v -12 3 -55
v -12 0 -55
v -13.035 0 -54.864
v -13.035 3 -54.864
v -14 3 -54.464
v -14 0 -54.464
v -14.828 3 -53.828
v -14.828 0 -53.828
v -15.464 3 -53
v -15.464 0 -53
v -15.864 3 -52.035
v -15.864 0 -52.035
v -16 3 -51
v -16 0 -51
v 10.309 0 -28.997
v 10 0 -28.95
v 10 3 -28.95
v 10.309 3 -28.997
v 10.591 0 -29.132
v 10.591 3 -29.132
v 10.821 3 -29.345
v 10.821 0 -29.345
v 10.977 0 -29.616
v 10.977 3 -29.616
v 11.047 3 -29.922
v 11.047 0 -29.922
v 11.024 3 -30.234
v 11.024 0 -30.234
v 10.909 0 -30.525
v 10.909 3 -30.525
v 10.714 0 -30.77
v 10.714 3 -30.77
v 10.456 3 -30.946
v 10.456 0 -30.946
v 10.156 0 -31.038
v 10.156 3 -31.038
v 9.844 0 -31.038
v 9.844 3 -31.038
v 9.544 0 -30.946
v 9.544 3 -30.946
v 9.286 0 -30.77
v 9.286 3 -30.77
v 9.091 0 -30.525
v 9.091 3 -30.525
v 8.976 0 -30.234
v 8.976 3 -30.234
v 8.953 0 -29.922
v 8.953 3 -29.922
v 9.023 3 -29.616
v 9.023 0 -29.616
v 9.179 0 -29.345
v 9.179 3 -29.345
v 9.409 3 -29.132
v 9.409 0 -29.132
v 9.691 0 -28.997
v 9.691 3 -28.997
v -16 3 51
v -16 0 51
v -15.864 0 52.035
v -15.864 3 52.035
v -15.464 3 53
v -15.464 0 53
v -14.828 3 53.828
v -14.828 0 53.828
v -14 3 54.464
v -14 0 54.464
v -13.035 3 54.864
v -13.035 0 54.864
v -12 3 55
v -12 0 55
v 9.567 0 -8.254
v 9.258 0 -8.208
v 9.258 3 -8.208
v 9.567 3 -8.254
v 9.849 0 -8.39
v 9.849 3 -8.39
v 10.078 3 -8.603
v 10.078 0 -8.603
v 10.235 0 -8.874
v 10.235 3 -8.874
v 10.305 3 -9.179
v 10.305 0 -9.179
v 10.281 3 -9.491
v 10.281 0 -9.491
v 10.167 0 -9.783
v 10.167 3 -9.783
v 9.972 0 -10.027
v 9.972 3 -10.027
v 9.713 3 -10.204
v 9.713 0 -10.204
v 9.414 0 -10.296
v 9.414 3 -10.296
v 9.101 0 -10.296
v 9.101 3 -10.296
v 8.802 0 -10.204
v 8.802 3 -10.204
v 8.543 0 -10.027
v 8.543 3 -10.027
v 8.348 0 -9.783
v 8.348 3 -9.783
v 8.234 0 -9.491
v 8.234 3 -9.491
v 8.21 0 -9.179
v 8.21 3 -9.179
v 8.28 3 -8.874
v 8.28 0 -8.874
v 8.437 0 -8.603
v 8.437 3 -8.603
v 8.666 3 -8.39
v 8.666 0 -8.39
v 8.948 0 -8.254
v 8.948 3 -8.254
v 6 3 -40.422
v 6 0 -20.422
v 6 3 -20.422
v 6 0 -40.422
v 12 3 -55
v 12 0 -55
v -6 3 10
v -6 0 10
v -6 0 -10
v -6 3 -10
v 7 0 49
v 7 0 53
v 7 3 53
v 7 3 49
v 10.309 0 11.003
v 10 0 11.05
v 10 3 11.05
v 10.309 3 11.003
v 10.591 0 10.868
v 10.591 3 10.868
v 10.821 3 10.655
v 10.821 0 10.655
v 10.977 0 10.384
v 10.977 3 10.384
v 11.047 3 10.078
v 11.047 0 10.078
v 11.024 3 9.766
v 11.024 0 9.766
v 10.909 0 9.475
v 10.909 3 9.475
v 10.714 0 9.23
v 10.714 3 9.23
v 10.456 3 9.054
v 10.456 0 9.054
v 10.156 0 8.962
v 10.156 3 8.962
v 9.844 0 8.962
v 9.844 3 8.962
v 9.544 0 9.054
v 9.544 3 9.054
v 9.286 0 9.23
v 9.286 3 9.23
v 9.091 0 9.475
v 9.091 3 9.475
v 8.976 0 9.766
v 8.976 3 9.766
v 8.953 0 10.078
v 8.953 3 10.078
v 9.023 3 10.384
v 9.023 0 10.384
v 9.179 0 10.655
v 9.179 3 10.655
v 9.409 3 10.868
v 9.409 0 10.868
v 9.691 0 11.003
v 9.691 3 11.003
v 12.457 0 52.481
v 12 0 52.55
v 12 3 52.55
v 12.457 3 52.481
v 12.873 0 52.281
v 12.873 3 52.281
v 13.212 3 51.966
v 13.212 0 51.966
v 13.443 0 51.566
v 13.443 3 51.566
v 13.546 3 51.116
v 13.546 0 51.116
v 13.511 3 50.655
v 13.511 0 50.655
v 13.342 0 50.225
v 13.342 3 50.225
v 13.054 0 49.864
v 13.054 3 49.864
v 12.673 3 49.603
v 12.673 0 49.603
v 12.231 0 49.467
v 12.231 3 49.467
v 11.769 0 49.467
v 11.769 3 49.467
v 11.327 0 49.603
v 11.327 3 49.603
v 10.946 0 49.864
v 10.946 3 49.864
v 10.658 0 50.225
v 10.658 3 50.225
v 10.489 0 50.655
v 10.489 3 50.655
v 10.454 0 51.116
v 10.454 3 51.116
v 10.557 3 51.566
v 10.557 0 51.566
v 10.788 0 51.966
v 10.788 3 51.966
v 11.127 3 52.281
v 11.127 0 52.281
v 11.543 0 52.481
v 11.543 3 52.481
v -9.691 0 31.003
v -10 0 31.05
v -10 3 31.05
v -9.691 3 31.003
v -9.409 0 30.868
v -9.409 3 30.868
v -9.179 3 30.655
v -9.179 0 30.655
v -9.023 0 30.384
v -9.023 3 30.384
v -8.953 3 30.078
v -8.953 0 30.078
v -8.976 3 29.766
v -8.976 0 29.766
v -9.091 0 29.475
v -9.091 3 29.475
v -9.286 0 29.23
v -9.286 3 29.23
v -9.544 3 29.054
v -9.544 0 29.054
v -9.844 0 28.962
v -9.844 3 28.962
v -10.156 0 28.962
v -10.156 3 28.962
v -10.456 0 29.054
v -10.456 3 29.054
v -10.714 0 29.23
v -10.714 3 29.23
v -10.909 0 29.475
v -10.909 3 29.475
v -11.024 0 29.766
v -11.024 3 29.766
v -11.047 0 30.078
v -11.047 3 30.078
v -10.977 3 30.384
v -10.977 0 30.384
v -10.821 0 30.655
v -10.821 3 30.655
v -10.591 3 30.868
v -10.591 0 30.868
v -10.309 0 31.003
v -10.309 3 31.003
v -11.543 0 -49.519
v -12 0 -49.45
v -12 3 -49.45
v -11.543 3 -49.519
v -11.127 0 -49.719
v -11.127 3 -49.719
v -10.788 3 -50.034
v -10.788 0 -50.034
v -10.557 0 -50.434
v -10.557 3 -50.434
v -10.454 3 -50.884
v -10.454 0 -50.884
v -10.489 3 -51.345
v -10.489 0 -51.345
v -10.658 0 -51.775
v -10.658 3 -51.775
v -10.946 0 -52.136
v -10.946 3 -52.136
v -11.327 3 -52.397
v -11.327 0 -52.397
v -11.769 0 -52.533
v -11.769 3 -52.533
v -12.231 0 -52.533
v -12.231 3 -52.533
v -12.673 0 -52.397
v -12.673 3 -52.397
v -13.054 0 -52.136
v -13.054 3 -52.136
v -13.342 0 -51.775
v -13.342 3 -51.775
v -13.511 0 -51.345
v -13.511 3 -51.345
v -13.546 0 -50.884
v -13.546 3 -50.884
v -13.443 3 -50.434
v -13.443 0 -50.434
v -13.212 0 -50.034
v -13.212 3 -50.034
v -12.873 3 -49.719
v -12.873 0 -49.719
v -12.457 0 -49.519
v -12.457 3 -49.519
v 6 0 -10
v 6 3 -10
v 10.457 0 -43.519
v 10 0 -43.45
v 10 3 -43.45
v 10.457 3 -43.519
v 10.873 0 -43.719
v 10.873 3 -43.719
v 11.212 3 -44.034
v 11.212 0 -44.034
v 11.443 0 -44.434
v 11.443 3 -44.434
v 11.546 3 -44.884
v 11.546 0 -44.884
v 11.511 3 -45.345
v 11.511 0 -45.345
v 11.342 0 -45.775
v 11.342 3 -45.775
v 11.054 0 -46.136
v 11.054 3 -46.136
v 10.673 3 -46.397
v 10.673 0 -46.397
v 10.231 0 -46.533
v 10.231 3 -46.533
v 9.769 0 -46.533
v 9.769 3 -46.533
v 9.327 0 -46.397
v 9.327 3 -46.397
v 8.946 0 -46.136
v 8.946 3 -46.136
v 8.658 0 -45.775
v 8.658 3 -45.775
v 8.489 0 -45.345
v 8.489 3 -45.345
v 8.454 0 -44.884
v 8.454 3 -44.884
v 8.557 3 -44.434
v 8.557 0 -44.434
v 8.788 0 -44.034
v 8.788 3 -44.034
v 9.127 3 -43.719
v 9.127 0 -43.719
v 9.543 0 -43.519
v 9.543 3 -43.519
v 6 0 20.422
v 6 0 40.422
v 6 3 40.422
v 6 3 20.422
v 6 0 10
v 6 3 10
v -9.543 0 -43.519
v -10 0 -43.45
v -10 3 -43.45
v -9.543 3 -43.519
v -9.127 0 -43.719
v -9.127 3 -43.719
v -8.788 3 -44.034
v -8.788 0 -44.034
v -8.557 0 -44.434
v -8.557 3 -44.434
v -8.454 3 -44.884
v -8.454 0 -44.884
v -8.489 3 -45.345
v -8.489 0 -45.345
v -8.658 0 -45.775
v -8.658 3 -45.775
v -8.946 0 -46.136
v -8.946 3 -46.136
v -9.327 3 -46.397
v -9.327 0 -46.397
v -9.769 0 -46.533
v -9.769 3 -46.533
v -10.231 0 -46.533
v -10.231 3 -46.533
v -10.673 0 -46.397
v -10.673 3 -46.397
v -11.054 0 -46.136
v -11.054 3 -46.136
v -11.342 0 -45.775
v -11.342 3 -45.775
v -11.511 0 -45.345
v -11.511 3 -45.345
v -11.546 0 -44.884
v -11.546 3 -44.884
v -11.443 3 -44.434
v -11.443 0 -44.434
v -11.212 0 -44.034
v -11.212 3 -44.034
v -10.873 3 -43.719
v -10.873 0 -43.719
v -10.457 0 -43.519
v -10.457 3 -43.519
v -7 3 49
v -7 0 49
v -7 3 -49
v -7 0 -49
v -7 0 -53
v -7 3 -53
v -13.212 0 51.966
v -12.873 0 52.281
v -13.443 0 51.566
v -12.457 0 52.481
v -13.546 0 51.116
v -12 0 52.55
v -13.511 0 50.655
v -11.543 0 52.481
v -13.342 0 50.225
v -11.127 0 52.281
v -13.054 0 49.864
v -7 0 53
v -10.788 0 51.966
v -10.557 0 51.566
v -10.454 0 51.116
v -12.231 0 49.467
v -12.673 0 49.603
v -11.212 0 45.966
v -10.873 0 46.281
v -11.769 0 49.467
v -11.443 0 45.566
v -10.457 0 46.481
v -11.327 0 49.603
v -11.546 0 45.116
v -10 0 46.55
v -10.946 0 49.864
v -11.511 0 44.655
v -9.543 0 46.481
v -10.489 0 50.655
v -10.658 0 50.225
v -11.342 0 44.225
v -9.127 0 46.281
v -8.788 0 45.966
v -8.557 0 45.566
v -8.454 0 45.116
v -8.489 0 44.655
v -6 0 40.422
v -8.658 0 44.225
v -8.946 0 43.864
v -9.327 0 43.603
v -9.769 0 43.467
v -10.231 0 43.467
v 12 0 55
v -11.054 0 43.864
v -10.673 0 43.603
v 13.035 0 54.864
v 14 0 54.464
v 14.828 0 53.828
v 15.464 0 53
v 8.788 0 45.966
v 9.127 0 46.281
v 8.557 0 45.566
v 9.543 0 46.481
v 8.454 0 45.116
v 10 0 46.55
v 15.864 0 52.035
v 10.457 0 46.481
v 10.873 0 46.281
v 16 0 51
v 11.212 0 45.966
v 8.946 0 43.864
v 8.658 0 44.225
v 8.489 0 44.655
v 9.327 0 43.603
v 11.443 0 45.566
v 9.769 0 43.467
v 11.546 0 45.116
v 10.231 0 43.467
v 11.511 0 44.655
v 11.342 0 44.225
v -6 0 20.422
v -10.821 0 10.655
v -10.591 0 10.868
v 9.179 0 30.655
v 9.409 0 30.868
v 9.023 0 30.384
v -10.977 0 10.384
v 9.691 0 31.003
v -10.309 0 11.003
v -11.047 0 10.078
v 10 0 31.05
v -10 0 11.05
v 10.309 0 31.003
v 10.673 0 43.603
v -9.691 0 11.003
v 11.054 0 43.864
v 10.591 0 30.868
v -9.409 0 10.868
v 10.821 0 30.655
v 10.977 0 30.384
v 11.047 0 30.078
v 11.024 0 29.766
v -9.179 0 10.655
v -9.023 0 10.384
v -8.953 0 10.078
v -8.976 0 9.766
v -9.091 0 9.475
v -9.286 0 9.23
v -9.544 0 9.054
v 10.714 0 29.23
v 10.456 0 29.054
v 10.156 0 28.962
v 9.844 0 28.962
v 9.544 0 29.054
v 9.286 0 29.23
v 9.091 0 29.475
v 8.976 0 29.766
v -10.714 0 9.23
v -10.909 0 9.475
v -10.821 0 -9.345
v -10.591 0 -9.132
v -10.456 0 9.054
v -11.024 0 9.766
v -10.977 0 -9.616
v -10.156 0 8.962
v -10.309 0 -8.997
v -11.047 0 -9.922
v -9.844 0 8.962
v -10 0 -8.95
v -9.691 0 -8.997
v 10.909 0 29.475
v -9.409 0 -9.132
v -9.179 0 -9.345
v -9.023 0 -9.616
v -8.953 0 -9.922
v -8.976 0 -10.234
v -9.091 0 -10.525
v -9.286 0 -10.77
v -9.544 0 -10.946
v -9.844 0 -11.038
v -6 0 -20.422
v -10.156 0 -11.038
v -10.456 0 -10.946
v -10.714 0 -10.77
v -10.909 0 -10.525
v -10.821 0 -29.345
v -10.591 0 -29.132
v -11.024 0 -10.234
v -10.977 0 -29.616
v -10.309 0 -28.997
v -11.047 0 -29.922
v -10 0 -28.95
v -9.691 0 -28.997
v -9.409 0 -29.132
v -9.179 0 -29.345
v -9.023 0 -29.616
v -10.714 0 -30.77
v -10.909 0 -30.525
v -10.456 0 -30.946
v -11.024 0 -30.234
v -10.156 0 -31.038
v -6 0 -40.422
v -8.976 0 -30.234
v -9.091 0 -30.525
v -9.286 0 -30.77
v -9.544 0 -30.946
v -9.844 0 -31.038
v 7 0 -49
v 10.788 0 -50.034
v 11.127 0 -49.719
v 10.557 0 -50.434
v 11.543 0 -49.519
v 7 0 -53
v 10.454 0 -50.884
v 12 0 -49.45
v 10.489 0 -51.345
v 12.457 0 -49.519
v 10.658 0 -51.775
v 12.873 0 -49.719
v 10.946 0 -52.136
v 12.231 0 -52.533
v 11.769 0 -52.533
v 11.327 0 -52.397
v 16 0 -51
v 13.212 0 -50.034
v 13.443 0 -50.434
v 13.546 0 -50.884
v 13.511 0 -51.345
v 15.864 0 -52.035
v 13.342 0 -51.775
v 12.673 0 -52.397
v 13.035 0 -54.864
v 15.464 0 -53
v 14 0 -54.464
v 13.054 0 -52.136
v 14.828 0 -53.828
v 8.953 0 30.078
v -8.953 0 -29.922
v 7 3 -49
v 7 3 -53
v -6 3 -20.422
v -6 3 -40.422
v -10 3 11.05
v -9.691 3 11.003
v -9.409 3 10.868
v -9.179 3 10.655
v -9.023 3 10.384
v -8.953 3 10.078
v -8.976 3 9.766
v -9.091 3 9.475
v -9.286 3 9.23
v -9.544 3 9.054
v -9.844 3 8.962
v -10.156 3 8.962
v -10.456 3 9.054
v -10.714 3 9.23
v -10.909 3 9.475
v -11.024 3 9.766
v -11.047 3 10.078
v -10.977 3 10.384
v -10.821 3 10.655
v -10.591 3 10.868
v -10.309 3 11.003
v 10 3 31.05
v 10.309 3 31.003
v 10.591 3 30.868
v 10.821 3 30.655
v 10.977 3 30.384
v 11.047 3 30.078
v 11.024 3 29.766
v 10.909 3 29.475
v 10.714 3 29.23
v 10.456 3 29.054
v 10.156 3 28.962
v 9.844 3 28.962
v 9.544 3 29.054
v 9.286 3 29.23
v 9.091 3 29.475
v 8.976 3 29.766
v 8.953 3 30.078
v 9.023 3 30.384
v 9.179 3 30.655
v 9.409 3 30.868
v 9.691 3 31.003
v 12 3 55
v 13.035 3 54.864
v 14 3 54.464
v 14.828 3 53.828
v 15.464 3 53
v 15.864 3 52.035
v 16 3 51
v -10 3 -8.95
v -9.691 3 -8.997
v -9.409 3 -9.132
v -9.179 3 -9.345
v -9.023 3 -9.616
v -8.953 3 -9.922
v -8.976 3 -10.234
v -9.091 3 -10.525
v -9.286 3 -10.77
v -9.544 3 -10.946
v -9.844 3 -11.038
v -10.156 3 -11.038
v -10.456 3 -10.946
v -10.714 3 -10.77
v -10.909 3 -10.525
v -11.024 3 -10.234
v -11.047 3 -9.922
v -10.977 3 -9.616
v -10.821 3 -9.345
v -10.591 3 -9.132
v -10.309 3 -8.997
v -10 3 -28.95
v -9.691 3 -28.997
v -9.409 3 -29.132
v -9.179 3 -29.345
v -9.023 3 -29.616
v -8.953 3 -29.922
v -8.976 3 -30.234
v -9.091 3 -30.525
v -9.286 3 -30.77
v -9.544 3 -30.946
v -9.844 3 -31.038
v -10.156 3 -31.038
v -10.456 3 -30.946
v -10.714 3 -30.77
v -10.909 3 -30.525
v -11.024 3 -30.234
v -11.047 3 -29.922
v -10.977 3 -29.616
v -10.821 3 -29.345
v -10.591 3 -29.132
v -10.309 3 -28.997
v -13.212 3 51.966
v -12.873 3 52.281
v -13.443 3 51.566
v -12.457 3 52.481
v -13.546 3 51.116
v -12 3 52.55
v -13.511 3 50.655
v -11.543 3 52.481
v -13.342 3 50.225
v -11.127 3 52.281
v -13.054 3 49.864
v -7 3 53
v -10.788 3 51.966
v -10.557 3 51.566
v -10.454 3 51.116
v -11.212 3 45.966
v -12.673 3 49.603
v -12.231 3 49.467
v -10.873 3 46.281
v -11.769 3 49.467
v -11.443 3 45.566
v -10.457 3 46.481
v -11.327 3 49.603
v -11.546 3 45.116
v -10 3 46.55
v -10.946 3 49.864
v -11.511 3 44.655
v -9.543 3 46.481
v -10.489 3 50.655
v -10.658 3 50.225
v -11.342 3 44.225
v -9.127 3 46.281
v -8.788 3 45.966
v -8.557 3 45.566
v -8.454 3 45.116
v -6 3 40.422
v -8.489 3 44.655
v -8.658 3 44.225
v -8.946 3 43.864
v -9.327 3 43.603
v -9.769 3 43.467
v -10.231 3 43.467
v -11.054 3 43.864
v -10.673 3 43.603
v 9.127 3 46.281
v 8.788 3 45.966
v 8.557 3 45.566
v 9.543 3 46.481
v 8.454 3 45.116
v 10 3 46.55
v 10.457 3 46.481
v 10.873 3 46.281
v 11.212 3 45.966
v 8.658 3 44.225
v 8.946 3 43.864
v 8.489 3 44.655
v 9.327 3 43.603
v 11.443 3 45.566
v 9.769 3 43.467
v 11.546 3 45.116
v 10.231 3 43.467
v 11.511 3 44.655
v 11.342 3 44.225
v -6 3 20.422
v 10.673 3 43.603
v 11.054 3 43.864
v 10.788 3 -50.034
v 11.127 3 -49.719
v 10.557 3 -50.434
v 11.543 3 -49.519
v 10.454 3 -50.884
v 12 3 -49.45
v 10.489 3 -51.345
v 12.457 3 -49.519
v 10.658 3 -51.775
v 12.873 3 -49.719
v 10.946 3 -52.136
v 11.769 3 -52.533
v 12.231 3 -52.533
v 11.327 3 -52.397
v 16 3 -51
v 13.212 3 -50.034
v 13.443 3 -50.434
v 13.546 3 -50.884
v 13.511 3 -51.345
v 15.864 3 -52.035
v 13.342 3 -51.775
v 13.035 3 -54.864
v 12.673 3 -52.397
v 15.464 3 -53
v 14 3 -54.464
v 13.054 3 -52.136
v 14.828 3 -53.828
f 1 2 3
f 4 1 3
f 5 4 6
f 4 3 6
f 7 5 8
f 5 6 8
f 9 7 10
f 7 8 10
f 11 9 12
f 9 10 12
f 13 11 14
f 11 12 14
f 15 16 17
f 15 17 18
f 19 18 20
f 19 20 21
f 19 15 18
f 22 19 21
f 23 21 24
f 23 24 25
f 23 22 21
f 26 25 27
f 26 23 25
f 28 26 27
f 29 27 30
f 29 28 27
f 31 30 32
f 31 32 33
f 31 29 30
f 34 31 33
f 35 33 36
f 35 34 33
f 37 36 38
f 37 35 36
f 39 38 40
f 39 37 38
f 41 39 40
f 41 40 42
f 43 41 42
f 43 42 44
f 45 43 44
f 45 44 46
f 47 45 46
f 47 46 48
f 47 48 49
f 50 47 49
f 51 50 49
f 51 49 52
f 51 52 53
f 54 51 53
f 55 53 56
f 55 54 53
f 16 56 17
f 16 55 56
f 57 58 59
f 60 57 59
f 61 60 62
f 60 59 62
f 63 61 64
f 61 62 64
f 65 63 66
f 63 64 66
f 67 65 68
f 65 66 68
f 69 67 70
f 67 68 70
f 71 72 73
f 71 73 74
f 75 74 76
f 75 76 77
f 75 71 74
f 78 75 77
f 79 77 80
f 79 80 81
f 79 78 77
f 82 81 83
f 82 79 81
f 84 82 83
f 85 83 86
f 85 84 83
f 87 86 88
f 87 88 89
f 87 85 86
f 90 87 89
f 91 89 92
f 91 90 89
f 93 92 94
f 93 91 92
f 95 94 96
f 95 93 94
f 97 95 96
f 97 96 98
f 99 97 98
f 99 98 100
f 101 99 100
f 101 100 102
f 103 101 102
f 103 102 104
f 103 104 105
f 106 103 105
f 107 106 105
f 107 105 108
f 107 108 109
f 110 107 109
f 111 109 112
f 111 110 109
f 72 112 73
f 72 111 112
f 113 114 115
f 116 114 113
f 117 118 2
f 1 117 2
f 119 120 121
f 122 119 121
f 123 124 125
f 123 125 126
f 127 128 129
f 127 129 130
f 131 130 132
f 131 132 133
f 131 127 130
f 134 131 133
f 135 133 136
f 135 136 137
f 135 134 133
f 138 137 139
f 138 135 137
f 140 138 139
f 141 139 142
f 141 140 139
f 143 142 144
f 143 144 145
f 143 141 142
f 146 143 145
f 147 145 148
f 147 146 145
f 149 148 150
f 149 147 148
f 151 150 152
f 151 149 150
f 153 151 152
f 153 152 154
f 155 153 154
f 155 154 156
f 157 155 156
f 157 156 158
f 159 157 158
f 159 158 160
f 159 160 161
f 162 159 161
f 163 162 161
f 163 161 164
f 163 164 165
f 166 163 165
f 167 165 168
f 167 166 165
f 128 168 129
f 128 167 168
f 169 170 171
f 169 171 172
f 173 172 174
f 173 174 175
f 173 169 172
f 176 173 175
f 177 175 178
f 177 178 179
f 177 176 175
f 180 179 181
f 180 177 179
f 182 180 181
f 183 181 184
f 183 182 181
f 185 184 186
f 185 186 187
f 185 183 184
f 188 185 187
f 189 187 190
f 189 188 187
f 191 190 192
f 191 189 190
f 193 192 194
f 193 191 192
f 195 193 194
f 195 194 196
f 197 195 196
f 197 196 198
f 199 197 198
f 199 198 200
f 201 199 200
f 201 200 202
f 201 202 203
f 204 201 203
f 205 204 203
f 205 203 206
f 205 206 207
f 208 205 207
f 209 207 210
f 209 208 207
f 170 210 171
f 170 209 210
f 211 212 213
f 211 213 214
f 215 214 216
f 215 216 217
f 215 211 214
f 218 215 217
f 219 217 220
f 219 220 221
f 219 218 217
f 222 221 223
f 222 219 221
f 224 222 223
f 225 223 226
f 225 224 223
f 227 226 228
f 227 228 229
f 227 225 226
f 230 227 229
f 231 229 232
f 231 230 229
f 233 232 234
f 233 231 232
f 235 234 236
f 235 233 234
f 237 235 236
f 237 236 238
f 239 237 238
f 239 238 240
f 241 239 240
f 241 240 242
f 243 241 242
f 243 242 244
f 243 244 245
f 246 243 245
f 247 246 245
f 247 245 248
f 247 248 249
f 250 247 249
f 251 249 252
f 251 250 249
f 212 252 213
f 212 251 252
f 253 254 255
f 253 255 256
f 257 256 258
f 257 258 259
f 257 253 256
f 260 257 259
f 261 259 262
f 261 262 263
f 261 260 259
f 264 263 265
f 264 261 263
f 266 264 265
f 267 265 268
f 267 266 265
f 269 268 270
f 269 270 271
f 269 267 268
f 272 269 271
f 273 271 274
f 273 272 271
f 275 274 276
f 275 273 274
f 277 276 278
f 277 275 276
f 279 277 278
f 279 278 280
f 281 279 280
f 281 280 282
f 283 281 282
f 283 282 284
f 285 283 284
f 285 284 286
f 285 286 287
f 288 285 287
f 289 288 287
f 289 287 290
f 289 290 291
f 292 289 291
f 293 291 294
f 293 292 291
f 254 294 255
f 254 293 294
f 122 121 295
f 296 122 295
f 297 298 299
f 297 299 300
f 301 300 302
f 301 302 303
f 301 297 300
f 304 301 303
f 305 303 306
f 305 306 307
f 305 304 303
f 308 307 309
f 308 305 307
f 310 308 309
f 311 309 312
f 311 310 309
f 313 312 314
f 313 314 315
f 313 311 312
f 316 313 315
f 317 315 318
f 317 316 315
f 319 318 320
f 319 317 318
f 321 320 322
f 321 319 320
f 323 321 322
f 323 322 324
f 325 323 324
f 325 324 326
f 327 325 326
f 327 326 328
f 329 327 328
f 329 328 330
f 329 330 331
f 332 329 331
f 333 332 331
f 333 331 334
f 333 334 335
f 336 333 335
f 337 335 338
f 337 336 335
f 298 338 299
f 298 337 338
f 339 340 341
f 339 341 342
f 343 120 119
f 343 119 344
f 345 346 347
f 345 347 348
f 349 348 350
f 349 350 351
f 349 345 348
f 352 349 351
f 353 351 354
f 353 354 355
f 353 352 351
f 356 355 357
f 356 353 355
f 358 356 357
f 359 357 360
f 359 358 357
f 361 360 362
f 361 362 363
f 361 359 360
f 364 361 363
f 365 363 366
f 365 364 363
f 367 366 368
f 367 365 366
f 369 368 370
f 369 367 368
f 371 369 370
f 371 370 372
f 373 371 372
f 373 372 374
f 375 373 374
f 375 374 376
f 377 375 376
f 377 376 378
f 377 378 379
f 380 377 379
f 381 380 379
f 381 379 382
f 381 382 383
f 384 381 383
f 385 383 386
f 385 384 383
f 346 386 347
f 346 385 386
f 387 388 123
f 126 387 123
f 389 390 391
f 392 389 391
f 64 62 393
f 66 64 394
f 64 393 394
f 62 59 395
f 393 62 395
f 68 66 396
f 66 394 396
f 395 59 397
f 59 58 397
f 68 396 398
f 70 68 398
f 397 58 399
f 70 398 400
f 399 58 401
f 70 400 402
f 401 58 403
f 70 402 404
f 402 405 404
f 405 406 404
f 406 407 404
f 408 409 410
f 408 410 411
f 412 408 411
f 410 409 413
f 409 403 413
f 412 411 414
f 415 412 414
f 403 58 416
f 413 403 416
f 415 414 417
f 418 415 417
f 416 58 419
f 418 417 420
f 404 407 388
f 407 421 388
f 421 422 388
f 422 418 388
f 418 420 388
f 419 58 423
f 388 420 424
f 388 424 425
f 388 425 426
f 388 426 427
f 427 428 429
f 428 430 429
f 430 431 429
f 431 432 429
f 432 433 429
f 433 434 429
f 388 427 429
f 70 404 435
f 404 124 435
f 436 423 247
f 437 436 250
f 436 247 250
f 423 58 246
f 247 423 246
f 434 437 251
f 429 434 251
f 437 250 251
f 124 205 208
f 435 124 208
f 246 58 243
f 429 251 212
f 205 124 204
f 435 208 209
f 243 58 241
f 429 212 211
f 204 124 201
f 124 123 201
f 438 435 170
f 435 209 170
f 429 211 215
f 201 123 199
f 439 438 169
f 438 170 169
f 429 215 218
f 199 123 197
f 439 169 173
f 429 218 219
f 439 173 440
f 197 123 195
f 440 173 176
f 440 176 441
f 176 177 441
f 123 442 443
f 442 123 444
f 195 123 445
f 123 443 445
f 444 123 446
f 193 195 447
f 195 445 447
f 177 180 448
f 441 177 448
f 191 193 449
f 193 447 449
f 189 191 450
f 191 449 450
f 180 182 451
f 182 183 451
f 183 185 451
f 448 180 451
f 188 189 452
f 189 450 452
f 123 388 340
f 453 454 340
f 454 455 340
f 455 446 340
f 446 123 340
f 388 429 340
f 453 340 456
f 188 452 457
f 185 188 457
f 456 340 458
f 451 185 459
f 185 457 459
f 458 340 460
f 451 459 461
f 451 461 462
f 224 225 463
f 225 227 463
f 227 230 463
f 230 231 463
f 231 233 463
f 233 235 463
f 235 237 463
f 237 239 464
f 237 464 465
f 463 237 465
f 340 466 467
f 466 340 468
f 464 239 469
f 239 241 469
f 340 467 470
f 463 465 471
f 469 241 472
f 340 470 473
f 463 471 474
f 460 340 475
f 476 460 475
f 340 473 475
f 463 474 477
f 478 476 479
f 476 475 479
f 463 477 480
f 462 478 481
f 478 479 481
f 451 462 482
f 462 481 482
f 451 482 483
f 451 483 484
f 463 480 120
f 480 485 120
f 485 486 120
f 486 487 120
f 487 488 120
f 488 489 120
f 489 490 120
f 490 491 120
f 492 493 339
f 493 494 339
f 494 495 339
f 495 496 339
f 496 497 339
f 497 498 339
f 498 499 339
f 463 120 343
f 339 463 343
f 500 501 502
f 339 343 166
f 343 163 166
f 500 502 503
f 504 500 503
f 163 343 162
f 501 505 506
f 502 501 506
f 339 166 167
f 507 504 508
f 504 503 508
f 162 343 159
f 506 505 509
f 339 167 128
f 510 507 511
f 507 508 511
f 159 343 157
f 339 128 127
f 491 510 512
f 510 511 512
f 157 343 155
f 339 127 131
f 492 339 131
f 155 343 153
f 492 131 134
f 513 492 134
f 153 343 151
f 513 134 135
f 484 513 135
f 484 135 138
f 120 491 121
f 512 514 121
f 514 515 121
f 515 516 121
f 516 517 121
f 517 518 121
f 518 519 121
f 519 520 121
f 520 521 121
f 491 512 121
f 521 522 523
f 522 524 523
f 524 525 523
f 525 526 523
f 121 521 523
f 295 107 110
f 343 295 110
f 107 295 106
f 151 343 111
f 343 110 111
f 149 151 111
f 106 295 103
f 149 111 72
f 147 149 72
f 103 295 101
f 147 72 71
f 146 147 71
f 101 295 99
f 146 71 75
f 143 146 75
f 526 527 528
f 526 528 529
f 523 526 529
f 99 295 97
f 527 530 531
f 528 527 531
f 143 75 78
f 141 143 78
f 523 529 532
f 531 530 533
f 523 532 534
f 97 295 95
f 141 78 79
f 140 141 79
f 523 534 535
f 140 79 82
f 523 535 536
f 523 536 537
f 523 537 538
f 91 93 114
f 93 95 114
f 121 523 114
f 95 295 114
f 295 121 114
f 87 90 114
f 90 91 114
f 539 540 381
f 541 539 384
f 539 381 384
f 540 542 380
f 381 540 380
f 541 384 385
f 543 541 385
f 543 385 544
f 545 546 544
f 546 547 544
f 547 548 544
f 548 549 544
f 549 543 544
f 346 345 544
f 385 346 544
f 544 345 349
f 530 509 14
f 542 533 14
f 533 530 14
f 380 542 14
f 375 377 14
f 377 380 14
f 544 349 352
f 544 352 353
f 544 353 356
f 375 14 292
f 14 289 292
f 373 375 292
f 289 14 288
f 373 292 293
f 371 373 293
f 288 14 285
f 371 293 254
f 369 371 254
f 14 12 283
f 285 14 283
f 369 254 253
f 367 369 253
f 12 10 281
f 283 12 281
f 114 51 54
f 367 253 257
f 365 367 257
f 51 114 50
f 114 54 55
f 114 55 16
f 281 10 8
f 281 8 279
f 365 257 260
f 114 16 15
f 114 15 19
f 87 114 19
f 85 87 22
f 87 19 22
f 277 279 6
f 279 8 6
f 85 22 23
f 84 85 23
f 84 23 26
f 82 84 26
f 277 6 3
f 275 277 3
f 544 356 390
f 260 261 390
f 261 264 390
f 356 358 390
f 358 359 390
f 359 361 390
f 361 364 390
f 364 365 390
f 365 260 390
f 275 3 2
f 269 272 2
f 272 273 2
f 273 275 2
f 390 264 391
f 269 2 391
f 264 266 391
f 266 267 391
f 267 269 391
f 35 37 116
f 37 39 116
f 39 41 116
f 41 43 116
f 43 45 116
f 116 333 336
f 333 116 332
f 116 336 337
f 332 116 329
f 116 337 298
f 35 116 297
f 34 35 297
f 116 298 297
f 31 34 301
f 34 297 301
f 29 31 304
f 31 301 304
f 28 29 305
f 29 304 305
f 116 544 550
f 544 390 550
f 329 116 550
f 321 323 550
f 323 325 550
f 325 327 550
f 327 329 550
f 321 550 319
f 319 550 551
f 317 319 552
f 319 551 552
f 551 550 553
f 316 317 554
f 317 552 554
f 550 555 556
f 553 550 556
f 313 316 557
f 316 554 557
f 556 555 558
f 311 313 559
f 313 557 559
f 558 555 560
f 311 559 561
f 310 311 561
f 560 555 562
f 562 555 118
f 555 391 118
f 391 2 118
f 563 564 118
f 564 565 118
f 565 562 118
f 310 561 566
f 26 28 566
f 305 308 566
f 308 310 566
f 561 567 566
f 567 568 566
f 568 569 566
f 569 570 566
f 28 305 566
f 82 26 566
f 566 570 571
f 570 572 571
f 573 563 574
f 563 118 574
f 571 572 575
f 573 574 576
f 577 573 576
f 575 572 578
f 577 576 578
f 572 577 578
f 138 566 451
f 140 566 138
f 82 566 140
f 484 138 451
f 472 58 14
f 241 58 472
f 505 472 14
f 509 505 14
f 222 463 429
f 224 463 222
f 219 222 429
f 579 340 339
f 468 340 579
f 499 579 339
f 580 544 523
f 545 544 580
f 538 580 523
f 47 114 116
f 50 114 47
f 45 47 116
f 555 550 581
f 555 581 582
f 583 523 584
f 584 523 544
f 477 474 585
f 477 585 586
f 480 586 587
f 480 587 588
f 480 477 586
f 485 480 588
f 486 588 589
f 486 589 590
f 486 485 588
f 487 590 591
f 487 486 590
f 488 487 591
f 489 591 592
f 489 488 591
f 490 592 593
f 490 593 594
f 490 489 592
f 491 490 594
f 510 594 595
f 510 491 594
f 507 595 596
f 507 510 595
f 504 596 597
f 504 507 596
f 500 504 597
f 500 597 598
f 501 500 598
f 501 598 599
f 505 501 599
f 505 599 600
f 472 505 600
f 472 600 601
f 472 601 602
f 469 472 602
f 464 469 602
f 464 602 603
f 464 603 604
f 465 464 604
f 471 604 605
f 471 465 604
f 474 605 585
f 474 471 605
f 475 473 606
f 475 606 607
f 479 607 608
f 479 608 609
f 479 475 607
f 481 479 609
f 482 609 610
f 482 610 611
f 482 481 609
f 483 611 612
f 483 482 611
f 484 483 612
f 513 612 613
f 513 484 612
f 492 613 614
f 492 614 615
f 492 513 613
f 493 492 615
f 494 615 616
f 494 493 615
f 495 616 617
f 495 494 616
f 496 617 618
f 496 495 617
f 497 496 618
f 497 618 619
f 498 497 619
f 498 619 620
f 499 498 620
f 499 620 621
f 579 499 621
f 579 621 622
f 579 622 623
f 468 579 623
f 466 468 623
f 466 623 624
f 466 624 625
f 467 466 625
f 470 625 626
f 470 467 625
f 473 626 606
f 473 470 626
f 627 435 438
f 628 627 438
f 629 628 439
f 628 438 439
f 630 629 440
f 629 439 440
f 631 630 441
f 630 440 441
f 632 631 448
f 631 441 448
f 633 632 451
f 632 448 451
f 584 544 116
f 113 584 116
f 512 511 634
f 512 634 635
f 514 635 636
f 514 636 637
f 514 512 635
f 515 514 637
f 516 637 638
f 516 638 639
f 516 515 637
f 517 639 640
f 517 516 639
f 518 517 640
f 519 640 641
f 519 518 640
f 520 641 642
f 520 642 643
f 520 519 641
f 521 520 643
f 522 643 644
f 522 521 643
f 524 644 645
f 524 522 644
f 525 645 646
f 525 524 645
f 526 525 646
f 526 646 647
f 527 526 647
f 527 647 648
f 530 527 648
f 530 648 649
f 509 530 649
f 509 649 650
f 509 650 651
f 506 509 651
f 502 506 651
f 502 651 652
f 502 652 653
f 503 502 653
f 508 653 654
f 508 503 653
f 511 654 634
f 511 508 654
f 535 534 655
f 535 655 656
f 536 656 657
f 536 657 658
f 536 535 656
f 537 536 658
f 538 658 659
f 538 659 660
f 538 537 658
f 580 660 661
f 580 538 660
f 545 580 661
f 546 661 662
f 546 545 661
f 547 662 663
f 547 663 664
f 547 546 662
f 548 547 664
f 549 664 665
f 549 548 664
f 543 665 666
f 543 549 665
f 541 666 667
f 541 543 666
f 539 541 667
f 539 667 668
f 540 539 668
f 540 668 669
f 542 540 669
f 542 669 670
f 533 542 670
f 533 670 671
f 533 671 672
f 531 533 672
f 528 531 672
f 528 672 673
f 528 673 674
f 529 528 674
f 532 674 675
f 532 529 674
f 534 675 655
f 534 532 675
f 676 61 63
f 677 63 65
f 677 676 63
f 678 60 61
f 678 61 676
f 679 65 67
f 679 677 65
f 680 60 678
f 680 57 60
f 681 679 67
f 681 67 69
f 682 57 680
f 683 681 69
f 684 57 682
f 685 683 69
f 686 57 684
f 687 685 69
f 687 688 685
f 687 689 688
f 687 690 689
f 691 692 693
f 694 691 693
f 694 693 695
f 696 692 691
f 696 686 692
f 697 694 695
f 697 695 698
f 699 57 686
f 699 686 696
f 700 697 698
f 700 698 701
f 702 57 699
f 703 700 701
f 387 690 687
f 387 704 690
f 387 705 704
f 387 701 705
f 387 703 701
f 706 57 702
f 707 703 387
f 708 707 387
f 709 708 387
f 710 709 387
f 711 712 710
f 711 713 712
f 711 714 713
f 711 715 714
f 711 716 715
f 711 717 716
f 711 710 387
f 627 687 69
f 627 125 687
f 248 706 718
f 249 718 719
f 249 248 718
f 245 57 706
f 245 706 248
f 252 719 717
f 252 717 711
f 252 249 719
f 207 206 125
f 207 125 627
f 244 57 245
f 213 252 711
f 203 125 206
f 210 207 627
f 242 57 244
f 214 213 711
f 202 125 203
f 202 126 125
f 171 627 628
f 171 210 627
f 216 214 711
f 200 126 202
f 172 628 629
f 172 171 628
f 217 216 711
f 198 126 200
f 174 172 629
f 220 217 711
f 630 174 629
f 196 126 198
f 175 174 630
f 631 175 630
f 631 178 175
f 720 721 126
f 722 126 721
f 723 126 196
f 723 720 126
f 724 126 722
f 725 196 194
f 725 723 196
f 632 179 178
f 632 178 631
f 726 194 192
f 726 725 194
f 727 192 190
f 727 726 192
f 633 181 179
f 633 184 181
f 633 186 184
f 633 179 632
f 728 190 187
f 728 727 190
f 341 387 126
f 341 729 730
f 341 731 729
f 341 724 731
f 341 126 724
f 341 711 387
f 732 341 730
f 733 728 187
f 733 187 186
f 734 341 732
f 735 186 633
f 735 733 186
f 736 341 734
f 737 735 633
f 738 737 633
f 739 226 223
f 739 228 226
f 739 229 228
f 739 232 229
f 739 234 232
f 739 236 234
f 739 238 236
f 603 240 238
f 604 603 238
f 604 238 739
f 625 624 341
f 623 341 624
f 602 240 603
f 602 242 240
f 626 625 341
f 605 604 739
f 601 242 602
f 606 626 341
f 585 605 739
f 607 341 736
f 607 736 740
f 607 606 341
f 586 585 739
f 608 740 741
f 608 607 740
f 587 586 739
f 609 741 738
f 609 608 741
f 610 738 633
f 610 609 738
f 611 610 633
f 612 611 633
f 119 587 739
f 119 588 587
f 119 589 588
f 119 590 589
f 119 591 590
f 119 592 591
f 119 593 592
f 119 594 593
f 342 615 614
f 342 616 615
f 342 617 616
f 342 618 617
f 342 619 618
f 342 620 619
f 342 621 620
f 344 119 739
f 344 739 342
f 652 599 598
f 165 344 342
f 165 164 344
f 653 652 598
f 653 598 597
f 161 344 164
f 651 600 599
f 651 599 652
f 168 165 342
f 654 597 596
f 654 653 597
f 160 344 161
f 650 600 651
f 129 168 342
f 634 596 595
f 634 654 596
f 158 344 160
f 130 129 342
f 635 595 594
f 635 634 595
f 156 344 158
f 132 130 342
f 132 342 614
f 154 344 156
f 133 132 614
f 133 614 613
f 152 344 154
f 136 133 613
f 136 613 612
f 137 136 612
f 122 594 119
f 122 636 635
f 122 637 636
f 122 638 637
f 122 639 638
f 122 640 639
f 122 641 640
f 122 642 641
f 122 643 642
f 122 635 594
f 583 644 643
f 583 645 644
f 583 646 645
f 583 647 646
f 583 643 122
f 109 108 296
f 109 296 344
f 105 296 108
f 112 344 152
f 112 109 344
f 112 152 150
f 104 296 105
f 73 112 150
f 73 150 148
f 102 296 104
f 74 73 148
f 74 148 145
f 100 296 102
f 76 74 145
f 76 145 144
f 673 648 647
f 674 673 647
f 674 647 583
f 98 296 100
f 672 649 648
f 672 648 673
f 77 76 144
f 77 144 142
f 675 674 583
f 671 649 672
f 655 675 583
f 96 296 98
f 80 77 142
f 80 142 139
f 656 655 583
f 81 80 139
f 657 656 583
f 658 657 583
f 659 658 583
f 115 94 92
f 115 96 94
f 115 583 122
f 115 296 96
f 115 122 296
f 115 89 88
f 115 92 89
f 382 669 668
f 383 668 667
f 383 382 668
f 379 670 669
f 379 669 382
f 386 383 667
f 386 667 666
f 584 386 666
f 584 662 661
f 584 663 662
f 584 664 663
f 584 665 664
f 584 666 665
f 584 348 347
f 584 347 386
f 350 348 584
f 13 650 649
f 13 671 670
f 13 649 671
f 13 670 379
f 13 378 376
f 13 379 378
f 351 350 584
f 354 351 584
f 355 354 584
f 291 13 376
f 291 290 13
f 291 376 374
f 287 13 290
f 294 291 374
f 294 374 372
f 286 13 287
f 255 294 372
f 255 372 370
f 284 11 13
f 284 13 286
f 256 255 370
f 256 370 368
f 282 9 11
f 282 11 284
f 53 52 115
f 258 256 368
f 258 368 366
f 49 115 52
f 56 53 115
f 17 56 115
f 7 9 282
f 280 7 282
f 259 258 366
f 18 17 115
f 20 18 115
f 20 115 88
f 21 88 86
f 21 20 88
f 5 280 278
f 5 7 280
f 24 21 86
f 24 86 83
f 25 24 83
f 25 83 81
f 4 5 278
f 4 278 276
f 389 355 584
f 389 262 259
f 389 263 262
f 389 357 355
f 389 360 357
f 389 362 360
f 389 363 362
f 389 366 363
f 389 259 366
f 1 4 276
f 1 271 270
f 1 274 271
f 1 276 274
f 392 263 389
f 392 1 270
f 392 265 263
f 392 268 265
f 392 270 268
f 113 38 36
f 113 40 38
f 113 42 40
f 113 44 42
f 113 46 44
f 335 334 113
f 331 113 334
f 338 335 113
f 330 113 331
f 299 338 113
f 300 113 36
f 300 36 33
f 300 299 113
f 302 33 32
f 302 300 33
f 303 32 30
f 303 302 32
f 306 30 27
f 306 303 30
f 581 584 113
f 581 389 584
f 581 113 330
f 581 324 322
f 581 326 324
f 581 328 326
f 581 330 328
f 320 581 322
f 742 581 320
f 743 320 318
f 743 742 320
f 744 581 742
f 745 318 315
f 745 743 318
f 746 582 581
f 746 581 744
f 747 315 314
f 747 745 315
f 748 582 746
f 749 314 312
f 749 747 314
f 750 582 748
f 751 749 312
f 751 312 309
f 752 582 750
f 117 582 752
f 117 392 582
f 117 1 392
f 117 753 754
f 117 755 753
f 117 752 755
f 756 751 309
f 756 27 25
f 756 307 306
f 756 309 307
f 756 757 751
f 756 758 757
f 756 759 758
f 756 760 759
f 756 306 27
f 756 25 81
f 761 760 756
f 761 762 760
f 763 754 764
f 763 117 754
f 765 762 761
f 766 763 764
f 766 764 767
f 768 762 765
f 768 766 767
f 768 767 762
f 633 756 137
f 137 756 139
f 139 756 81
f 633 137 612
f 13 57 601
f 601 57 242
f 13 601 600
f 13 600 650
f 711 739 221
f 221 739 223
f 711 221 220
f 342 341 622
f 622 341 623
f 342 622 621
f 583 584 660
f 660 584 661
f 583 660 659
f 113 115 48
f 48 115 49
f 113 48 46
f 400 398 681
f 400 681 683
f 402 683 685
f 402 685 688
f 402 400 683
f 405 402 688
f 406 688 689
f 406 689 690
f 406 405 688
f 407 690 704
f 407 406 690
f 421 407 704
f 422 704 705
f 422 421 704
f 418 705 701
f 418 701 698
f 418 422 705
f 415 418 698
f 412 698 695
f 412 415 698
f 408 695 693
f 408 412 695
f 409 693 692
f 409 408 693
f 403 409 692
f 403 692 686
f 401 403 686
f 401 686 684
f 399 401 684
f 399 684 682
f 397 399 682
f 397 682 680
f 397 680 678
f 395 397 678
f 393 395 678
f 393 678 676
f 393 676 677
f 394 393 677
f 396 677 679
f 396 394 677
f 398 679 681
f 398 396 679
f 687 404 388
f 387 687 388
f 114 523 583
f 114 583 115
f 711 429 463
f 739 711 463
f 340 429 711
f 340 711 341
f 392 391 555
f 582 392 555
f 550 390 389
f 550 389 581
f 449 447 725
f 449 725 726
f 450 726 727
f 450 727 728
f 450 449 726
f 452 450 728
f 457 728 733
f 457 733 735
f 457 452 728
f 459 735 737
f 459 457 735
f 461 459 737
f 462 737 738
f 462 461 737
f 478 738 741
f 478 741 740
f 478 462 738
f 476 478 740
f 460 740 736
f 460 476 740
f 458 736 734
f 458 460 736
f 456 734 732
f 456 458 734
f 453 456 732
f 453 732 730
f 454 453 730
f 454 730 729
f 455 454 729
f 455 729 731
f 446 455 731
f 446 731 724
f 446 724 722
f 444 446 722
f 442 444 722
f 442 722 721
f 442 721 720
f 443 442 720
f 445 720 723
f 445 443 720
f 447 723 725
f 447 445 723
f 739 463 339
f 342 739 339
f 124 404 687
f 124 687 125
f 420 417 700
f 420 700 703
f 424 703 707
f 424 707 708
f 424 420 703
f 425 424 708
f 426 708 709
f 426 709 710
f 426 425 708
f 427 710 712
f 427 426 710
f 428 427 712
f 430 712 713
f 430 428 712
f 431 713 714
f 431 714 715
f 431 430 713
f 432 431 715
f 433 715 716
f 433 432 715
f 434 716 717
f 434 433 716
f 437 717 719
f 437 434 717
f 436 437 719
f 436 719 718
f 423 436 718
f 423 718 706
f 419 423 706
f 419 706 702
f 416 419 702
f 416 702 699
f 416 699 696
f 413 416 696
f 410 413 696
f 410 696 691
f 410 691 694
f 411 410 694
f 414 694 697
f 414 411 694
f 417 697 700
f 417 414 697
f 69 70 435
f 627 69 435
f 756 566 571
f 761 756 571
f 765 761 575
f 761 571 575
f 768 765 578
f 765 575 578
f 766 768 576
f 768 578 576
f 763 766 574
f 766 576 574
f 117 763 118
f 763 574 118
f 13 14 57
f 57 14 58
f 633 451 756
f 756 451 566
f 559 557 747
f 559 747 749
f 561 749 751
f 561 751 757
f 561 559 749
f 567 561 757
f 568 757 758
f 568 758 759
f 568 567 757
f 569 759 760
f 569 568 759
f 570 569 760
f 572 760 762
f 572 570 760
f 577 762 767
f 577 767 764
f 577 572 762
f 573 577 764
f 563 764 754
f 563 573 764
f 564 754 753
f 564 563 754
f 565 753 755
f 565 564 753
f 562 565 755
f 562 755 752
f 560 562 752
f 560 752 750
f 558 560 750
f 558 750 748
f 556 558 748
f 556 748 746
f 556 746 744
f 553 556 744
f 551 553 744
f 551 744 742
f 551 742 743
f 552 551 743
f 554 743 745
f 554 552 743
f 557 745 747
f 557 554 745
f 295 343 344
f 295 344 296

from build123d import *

# Parameters (mm, degrees)
SKETCH_1_R      = 1.05
SKETCH_1_R_2    = 1.55
SKETCH_1_W      = 12
SKETCH_1_H      = 20
SKETCH_1_W_2    = 14
SKETCH_1_H_2    = 4
EXTRUDE_1_DEPTH = 3


with BuildPart() as part:
    # 草图1 → 凸台-拉伸1 (new body)
    with BuildSketch(Plane(origin=(0, 0, 0), x_dir=(1, 0, 0), z_dir=(0, 1, 0))):
        with BuildLine():
            Line((-16, -37.476129922), (-16, -51))
            ThreePointArc((-16, -51), (-14.828427125, -53.828427125), (-12, -55))
            Line((-12, -55), (12, -55))
            ThreePointArc((12, -55), (14.828427125, -53.828427125), (16, -51))
            Line((16, -51), (16, -37.476129922))
            Line((16, -37.476129922), (16, 25.467140075))
            Line((16, 25.467140075), (16, 51))
            ThreePointArc((16, 51), (14.828427125, 53.828427125), (12, 55))
            Line((12, 55), (-12, 55))
            ThreePointArc((-12, 55), (-14.828427125, 53.828427125), (-16, 51))
            Line((-16, 51), (-16, 31.142350414))
            Line((-16, 31.142350414), (-16, -37.476129922))
        make_face()
        with Locations(Location((-10, 30, 0), (0, 0, 270))):
            Circle(SKETCH_1_R, mode=Mode.SUBTRACT)
        with Locations(Location((10, 30, 0), (0, 0, 270))):
            Circle(SKETCH_1_R, mode=Mode.SUBTRACT)
        with Locations(Location((-10, 10, 0), (0, 0, 270))):
            Circle(SKETCH_1_R, mode=Mode.SUBTRACT)
        with Locations(Location((10, -10, 0), (0, 0, 270))):
            Circle(SKETCH_1_R, mode=Mode.SUBTRACT)
        with Locations(Location((-10, -30, 0), (0, 0, 270))):
            Circle(SKETCH_1_R, mode=Mode.SUBTRACT)
        with Locations(Location((10, -30, 0), (0, 0, 270))):
            Circle(SKETCH_1_R, mode=Mode.SUBTRACT)
        with Locations(Location((10, -45, 0), (0, 0, 270))):
            Circle(SKETCH_1_R_2, mode=Mode.SUBTRACT)
        with Locations(Location((-10, -45, 0), (0, 0, 270))):
            Circle(SKETCH_1_R_2, mode=Mode.SUBTRACT)
        with Locations(Location((10, 45, 0), (0, 0, 270))):
            Circle(SKETCH_1_R_2, mode=Mode.SUBTRACT)
        with Locations(Location((-10, 45, 0), (0, 0, 270))):
            Circle(SKETCH_1_R_2, mode=Mode.SUBTRACT)
        with Locations(Location((9.25753788, 9.25753788, 0), (0, 0, 270))):
            Circle(SKETCH_1_R, mode=Mode.SUBTRACT)
        with Locations(Location((-10, -10, 0), (0, 0, 270))):
            Circle(SKETCH_1_R, mode=Mode.SUBTRACT)
        with Locations(Location((-12, 51, 0), (0, 0, 270))):
            Circle(SKETCH_1_R_2, mode=Mode.SUBTRACT)
        with Locations(Location((12, 51, 0), (0, 0, 270))):
            Circle(SKETCH_1_R_2, mode=Mode.SUBTRACT)
        with Locations(Location((-12, -51, 0), (0, 0, 270))):
            Circle(SKETCH_1_R_2, mode=Mode.SUBTRACT)
        with Locations(Location((12, -51, 0), (0, 0, 270))):
            Circle(SKETCH_1_R_2, mode=Mode.SUBTRACT)
        with Locations((0, 30.422470983)):
            Rectangle(SKETCH_1_W, SKETCH_1_H, mode=Mode.SUBTRACT)
        with Locations((0, 51)):
            Rectangle(SKETCH_1_W_2, SKETCH_1_H_2, mode=Mode.SUBTRACT)
        with Locations((0, -30.422470983)):
            Rectangle(SKETCH_1_W, SKETCH_1_H, mode=Mode.SUBTRACT)
        with Locations((0, -51)):
            Rectangle(SKETCH_1_W_2, SKETCH_1_H_2, mode=Mode.SUBTRACT)
        Rectangle(SKETCH_1_W, SKETCH_1_H, mode=Mode.SUBTRACT)
    extrude(amount=EXTRUDE_1_DEPTH)


solid = part.part
